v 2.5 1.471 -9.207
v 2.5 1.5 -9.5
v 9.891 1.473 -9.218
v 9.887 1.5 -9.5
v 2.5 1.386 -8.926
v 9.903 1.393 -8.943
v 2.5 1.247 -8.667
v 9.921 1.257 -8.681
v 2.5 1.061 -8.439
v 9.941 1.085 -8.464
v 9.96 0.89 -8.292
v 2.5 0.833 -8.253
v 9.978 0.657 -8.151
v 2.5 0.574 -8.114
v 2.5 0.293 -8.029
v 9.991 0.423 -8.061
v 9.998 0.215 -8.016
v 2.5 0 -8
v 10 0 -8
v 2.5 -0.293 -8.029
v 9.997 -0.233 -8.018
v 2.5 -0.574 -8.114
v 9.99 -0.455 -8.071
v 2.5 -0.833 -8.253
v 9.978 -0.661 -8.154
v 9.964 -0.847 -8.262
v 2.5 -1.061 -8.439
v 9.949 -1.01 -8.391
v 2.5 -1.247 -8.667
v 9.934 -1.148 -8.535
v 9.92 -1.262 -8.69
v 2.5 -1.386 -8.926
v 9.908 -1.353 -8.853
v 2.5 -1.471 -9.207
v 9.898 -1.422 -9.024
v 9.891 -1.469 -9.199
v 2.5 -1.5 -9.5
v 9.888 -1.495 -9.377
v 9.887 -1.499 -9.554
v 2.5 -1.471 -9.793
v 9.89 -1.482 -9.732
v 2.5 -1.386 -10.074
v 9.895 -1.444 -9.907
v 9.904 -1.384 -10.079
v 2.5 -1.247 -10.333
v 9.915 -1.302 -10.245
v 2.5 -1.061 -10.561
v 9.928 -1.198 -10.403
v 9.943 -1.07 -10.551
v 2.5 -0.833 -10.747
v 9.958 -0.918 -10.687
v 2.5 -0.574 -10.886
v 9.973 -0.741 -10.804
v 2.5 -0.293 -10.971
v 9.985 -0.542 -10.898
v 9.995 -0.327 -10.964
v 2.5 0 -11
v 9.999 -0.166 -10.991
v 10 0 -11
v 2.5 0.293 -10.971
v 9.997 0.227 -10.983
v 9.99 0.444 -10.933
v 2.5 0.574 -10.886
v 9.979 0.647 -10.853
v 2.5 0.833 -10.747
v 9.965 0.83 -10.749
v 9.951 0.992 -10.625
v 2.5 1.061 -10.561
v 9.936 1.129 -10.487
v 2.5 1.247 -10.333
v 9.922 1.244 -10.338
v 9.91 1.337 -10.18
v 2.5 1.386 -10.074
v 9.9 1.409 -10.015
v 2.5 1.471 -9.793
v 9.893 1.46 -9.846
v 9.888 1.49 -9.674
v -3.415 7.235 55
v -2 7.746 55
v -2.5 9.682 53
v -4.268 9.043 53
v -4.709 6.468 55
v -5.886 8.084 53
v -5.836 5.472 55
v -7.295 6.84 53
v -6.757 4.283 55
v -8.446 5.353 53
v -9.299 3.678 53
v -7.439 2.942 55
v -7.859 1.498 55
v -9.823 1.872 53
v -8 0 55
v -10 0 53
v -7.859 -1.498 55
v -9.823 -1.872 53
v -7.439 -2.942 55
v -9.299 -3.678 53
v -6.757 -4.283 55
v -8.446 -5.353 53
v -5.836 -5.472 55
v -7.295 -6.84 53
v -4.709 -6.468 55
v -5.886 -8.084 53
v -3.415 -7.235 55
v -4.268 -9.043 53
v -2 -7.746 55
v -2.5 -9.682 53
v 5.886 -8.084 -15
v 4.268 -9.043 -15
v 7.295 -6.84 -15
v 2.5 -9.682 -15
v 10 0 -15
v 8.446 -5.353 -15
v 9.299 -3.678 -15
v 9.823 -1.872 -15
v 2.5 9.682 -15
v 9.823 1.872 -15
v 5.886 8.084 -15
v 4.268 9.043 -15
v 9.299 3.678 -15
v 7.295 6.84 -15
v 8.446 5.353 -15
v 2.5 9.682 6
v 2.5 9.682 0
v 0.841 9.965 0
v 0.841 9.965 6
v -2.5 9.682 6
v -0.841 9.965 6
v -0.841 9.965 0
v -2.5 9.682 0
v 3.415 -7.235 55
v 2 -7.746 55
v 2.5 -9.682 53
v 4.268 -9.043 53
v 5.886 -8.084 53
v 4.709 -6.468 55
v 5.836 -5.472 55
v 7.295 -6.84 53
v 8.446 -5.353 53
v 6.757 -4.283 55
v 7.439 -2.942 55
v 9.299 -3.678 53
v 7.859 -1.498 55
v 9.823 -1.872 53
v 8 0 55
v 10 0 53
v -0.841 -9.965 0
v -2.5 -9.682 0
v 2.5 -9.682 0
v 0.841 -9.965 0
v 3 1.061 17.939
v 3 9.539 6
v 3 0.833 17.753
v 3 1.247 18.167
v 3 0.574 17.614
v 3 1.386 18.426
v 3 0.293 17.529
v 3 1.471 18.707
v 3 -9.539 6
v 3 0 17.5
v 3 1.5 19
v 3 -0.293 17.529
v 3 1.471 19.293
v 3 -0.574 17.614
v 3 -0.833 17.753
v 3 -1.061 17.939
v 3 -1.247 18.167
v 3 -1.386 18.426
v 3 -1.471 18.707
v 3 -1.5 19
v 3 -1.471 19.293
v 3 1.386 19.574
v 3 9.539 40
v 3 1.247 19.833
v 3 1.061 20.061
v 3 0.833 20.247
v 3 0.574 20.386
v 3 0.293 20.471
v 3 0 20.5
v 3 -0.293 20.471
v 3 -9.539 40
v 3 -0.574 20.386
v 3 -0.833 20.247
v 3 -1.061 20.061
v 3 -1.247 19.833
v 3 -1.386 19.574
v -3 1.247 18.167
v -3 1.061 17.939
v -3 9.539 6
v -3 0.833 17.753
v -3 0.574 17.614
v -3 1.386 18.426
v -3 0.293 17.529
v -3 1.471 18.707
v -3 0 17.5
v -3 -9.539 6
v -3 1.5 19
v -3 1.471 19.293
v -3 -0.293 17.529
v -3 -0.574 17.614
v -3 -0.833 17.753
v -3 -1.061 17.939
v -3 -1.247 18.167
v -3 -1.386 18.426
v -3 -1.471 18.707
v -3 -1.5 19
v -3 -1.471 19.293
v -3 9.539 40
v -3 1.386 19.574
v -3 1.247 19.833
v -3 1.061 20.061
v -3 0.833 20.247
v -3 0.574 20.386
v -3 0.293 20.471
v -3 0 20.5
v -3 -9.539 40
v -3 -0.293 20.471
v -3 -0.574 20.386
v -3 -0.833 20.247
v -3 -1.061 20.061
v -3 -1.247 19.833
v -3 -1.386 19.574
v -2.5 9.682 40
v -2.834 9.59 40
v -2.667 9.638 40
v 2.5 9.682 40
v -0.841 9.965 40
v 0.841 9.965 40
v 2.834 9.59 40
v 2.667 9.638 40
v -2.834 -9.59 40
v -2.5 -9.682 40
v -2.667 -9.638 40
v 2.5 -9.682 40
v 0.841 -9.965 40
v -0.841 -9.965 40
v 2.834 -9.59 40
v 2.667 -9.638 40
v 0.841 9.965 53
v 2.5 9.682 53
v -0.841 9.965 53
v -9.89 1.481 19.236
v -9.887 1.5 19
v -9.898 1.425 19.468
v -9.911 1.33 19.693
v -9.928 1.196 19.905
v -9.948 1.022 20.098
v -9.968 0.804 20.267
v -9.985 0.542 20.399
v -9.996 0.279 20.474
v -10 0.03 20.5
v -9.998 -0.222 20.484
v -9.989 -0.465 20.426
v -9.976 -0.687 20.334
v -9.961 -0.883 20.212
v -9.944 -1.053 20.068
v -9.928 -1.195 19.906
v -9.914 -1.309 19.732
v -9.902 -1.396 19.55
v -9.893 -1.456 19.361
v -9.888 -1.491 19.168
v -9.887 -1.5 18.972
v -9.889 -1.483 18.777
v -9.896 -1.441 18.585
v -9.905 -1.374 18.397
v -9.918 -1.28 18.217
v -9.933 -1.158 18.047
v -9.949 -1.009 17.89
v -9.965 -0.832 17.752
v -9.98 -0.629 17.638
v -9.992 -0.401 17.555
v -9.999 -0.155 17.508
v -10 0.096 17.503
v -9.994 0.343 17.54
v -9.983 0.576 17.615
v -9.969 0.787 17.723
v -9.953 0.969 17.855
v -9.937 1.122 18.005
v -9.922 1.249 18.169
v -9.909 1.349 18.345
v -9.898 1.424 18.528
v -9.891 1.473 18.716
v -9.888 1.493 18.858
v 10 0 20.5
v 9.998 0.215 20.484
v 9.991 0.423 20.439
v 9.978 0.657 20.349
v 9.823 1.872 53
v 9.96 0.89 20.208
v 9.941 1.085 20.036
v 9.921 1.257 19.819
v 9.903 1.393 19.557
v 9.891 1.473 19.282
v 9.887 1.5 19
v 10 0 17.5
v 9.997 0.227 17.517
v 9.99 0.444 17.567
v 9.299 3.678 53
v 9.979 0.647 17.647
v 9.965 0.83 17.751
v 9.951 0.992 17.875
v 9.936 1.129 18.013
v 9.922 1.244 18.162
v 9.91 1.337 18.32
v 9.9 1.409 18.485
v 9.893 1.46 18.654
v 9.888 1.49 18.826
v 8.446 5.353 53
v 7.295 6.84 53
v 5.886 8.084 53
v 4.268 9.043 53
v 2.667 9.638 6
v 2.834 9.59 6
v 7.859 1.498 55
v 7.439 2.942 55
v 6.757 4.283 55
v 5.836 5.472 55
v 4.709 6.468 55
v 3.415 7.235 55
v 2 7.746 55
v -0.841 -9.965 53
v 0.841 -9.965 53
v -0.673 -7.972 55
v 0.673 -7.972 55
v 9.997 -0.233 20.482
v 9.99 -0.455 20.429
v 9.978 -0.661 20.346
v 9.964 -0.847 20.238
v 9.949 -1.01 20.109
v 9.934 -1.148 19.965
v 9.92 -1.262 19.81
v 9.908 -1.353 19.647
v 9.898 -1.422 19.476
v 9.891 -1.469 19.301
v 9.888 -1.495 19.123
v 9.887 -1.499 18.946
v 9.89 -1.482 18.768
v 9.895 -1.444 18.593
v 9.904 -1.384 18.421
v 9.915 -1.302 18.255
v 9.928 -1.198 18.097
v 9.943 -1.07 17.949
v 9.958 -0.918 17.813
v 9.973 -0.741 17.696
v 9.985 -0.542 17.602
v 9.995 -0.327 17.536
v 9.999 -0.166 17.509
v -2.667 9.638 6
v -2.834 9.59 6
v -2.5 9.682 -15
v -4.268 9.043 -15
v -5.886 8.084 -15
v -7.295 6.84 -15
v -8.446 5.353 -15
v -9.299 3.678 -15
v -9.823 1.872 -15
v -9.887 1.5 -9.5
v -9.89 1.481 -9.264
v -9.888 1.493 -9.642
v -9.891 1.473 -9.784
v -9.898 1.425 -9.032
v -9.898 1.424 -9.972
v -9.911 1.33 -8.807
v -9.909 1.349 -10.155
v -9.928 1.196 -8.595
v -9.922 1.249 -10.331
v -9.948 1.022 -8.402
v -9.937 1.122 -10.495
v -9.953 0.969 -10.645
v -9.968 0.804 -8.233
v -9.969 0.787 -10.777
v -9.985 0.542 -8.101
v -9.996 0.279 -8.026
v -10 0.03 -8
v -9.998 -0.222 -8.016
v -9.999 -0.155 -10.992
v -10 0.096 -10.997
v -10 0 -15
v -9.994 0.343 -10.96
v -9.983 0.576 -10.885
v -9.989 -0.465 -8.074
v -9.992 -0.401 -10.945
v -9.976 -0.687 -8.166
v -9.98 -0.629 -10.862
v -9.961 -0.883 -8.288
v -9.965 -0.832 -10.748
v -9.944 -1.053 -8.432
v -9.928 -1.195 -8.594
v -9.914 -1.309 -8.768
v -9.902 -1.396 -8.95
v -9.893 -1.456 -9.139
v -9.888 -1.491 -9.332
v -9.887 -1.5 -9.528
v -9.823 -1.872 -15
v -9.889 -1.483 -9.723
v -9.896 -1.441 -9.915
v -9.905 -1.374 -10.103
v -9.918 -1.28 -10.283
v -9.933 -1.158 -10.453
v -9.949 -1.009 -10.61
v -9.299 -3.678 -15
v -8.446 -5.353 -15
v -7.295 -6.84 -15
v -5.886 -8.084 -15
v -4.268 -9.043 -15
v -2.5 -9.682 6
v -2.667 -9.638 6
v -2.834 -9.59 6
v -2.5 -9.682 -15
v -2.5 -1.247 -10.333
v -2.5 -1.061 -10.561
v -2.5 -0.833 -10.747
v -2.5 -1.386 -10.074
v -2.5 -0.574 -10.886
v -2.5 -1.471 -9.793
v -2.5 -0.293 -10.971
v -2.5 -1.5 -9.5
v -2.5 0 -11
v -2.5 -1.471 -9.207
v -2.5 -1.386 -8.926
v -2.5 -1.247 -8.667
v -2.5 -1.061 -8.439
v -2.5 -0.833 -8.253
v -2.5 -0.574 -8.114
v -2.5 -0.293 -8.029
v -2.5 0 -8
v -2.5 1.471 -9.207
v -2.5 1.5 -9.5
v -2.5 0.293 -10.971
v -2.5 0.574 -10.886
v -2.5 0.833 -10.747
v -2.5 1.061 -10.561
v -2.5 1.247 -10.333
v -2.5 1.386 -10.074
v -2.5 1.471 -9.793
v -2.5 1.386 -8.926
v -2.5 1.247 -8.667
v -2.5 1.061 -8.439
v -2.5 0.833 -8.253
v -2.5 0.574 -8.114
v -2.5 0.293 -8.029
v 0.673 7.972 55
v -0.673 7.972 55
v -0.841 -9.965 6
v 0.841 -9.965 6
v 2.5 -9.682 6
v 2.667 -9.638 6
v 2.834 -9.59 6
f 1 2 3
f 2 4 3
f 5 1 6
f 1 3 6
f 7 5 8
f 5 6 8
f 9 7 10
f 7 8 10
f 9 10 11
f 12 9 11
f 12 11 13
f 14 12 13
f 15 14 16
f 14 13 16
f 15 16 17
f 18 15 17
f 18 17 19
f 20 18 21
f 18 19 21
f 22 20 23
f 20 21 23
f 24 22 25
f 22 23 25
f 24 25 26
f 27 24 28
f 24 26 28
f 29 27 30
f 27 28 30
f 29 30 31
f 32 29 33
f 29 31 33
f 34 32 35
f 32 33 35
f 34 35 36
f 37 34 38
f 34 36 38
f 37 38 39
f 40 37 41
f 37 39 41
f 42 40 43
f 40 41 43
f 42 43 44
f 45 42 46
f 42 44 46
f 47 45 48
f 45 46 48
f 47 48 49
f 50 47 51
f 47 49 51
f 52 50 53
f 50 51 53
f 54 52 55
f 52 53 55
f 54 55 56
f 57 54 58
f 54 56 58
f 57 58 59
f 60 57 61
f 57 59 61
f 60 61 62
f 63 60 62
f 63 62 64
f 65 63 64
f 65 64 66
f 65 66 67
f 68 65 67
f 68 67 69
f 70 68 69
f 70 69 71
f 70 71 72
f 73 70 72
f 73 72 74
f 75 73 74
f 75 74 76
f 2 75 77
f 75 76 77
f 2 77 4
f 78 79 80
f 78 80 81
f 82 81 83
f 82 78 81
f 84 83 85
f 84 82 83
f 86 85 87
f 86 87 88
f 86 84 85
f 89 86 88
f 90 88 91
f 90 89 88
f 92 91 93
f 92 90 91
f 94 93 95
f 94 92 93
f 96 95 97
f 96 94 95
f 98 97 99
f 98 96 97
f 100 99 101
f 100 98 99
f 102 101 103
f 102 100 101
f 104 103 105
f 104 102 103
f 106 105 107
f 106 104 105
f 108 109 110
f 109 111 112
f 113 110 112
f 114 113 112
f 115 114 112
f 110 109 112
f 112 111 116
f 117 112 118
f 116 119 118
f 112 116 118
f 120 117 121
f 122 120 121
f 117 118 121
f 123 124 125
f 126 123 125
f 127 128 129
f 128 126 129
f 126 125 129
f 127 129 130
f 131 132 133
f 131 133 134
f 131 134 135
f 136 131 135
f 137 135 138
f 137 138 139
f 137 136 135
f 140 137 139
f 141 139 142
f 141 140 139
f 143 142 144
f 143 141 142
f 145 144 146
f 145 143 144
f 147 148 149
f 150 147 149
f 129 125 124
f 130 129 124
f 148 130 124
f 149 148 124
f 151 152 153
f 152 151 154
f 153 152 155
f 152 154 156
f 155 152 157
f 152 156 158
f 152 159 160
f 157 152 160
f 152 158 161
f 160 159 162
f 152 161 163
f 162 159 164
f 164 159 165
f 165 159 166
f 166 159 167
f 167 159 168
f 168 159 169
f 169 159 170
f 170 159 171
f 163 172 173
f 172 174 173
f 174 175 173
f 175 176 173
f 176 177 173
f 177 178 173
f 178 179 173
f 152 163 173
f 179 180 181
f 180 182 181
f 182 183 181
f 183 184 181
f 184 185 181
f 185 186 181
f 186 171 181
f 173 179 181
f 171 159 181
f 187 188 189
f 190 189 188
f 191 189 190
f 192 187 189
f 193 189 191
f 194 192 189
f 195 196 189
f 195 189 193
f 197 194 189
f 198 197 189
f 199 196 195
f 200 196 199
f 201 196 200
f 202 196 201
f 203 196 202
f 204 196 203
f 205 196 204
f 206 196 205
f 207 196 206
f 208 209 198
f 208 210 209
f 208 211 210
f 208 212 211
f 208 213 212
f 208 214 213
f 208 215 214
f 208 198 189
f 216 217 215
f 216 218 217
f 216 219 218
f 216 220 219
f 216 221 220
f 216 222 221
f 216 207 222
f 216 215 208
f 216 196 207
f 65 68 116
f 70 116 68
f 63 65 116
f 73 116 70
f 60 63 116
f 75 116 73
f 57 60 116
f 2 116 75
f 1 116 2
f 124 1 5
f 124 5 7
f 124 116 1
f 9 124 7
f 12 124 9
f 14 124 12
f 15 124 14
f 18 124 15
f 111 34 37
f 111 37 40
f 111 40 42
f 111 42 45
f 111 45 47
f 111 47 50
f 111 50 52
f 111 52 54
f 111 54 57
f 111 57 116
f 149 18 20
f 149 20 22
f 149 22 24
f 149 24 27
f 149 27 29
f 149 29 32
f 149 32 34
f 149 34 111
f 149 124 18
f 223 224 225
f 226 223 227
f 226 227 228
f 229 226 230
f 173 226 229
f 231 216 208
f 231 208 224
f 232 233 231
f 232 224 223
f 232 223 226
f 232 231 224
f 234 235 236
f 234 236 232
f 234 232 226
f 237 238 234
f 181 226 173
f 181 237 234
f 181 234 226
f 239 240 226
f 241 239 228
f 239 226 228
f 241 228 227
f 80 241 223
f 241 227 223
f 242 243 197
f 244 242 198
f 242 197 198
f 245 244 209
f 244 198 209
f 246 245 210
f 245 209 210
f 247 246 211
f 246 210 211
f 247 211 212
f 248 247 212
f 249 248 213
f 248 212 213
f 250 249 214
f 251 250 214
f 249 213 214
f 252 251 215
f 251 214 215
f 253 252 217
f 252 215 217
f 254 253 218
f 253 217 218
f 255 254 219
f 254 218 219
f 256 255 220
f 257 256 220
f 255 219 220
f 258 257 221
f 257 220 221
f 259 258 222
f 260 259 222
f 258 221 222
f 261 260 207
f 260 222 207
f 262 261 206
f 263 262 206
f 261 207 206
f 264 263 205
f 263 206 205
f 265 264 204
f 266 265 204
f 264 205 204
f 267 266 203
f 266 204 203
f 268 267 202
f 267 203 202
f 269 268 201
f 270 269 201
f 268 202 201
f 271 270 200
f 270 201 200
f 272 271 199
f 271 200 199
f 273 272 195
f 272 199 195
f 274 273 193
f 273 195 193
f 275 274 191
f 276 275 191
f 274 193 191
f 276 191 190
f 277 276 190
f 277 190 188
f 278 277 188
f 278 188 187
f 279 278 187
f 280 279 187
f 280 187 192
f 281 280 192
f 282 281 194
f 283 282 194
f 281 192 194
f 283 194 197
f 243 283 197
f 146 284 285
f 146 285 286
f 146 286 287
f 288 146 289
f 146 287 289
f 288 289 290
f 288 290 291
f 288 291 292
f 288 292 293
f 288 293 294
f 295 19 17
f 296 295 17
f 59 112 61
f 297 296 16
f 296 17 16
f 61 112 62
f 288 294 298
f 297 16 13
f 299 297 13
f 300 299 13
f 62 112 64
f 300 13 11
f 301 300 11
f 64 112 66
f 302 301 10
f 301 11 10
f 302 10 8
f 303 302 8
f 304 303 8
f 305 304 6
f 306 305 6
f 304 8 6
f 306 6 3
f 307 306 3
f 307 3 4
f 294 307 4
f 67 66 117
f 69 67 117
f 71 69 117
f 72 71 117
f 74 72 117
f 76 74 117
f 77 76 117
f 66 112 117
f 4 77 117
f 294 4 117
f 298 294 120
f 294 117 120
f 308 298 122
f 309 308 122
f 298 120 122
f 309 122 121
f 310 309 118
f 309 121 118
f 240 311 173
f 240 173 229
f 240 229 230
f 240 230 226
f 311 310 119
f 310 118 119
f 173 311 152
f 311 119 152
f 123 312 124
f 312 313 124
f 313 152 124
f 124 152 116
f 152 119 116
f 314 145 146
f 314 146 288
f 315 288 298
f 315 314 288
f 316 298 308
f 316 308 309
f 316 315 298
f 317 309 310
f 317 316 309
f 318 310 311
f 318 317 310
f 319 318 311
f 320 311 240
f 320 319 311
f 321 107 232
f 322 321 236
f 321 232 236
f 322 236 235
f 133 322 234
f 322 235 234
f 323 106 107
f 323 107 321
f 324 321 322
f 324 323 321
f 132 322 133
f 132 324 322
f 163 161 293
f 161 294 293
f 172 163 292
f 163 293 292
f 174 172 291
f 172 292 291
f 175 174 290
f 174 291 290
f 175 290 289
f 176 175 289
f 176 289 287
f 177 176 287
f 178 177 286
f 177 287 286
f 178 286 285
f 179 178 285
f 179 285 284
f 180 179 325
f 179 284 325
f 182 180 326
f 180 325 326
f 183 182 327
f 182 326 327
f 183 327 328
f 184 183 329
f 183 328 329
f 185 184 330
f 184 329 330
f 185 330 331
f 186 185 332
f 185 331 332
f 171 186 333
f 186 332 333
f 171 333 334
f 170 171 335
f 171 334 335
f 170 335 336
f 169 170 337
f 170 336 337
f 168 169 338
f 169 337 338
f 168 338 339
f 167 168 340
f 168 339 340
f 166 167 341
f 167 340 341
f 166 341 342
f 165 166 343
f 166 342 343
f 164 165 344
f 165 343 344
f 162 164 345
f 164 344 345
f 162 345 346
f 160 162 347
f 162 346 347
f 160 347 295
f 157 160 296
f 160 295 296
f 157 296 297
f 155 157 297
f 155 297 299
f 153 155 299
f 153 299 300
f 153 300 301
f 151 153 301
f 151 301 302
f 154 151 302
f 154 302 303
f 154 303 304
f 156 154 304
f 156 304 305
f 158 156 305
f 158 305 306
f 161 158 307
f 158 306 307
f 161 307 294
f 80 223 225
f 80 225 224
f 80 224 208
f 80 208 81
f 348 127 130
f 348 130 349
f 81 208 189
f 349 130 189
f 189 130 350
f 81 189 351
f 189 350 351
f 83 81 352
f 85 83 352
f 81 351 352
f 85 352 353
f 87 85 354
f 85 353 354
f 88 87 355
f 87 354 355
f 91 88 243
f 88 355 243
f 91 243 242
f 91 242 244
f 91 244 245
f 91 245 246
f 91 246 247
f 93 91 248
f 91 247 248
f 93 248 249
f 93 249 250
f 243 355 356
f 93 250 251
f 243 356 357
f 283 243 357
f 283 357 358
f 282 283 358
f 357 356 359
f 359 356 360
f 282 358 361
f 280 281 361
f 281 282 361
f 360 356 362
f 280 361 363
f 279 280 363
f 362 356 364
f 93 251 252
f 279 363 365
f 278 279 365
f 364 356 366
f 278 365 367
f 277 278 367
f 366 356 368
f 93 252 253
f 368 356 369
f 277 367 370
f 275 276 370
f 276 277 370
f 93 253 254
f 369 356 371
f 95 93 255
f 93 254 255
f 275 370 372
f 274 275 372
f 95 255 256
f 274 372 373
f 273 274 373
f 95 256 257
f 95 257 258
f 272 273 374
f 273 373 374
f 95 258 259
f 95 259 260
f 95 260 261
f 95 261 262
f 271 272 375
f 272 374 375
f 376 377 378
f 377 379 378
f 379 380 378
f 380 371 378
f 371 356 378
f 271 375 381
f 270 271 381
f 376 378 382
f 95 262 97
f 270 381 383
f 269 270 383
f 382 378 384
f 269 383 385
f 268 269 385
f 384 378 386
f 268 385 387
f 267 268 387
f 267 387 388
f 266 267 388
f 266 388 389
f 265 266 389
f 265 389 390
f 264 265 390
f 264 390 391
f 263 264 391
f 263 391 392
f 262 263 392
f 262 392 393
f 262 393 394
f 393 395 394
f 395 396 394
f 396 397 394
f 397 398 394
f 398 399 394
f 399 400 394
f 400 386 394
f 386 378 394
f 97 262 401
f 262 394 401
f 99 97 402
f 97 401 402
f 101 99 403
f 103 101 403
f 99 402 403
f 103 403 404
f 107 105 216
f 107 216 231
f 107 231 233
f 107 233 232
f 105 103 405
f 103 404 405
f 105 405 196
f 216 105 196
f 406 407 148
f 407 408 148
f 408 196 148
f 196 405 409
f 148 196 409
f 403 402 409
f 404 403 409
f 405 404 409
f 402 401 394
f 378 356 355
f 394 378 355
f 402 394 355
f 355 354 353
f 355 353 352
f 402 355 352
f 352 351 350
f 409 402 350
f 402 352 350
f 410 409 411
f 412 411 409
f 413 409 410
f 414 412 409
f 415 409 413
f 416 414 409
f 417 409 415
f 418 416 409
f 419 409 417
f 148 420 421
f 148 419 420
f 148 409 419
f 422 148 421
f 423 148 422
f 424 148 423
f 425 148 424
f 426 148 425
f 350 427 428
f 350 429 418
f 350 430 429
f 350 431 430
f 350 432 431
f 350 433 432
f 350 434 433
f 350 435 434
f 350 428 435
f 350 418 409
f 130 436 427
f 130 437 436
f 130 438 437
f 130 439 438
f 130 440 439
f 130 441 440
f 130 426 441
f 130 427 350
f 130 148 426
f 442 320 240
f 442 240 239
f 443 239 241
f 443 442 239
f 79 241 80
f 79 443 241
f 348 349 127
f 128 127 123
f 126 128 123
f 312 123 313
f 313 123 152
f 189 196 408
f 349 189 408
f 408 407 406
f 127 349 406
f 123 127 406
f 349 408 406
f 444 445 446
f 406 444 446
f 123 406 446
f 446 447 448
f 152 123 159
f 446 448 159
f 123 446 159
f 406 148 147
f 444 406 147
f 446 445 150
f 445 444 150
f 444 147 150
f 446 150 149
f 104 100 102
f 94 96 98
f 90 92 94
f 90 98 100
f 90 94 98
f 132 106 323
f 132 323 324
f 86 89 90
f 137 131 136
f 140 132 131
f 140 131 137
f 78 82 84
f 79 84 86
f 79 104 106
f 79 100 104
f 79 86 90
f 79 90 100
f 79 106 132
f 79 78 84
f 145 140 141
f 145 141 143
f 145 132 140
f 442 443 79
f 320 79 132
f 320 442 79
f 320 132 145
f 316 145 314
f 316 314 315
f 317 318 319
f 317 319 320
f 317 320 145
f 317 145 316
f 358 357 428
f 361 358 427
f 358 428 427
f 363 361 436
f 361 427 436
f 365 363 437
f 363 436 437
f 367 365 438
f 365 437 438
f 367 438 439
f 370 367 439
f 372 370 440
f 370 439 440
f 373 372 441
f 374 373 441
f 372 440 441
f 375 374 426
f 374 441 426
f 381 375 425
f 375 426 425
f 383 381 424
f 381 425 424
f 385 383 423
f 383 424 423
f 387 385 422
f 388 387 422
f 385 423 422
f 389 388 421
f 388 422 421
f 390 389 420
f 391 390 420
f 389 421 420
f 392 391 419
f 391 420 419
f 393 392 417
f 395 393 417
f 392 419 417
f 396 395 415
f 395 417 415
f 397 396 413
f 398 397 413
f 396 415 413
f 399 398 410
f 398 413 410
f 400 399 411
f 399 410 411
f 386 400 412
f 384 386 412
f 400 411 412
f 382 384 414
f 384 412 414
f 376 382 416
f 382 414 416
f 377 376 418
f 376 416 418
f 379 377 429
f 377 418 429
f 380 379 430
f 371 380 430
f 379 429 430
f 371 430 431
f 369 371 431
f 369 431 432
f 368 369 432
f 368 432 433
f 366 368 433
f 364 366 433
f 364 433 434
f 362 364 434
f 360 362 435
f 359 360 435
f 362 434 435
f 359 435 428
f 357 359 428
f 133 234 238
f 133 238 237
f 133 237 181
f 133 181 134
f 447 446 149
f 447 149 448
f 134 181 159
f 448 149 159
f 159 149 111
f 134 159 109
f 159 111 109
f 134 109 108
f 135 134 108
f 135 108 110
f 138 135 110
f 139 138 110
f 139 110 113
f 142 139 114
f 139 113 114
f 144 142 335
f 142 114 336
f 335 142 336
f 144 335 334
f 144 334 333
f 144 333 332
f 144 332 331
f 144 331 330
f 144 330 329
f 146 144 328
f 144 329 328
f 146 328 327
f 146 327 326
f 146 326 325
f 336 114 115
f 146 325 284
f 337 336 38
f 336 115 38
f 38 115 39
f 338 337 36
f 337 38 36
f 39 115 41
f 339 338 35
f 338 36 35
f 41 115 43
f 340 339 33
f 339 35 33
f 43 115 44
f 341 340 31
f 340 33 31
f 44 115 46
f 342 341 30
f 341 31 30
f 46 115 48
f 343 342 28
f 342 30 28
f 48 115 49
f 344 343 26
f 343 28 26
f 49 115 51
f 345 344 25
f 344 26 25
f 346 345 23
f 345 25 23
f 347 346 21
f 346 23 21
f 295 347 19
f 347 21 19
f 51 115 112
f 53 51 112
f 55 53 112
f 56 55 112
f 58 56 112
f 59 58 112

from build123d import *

# Parameters (mm, degrees)
F1_DEPTH = 55
F2_DEPTH = 15
F3_SIZE  = 2
F4_R     = 1.5
F5_DEPTH = 25
F6_W     = 6
F6_H     = 34
F7_DEPTH = 12.5
F8_R     = 1.5
F9_DEPTH = 12.5


with BuildPart() as f1:
    # F0 (on Top) → F1 (new body)
    with BuildSketch(Plane.XY):
        with BuildLine():
            ThreePointArc((2.5, -9.6824583655), (7.9056941504, -6.123724357), (10, 0))
            ThreePointArc((10, 0), (7.9056941504, 6.123724357), (2.5, 9.6824583655))
            Line((2.5, 9.6824583655), (2.5, -9.6824583655))
        make_face()
        with BuildLine():
            Line((2.5, -9.6824583655), (2.5, 9.6824583655))
            ThreePointArc((2.5, 9.6824583655), (0, 10), (-2.5, 9.6824583655))
            Line((-2.5, 9.6824583655), (-2.5, -9.6824583655))
            ThreePointArc((-2.5, -9.6824583655), (0, -10), (2.5, -9.6824583655))
        make_face()
        with BuildLine():
            Line((-2.5, -9.6824583655), (-2.5, 9.6824583655))
            ThreePointArc((-2.5, 9.6824583655), (-10, 0), (-2.5, -9.6824583655))
        make_face()
    extrude(amount=F1_DEPTH)

    # F0 (on Top) → F2 (join)
    with BuildSketch(Plane.XY):
        with BuildLine():
            Line((-2.5, -9.6824583655), (-2.5, 9.6824583655))
            ThreePointArc((-2.5, 9.6824583655), (-10, 0), (-2.5, -9.6824583655))
        make_face()
        with BuildLine():
            ThreePointArc((2.5, -9.6824583655), (7.9056941504, -6.123724357), (10, 0))
            ThreePointArc((10, 0), (7.9056941504, 6.123724357), (2.5, 9.6824583655))
            Line((2.5, 9.6824583655), (2.5, -9.6824583655))
        make_face()
    extrude(amount=-F2_DEPTH)

    # F3
    f3_edges = [f1.edges().sort_by_distance(p)[0] for p in [
        (2.5, -9.682458, 55),
    ]]
    chamfer(f3_edges, length=F3_SIZE)

    # F4 (on Right) → F5 (cut, symmetric)
    with BuildSketch(Plane.YZ):
        with Locations((0, -9.5)):
            Circle(F4_R)
    extrude(amount=F5_DEPTH, both=True, mode=Mode.SUBTRACT)

    # F6 (on Front) → F7 (cut, symmetric)
    with BuildSketch(Plane.XZ):
        with Locations((0, 23)):
            Rectangle(F6_W, F6_H)
    extrude(amount=F7_DEPTH, both=True, mode=Mode.SUBTRACT)

    # F8 (on Right) → F9 (cut, symmetric)
    with BuildSketch(Plane.YZ):
        with Locations((0, 19)):
            Circle(F8_R)
    extrude(amount=F9_DEPTH, both=True, mode=Mode.SUBTRACT)


solid = f1.part
